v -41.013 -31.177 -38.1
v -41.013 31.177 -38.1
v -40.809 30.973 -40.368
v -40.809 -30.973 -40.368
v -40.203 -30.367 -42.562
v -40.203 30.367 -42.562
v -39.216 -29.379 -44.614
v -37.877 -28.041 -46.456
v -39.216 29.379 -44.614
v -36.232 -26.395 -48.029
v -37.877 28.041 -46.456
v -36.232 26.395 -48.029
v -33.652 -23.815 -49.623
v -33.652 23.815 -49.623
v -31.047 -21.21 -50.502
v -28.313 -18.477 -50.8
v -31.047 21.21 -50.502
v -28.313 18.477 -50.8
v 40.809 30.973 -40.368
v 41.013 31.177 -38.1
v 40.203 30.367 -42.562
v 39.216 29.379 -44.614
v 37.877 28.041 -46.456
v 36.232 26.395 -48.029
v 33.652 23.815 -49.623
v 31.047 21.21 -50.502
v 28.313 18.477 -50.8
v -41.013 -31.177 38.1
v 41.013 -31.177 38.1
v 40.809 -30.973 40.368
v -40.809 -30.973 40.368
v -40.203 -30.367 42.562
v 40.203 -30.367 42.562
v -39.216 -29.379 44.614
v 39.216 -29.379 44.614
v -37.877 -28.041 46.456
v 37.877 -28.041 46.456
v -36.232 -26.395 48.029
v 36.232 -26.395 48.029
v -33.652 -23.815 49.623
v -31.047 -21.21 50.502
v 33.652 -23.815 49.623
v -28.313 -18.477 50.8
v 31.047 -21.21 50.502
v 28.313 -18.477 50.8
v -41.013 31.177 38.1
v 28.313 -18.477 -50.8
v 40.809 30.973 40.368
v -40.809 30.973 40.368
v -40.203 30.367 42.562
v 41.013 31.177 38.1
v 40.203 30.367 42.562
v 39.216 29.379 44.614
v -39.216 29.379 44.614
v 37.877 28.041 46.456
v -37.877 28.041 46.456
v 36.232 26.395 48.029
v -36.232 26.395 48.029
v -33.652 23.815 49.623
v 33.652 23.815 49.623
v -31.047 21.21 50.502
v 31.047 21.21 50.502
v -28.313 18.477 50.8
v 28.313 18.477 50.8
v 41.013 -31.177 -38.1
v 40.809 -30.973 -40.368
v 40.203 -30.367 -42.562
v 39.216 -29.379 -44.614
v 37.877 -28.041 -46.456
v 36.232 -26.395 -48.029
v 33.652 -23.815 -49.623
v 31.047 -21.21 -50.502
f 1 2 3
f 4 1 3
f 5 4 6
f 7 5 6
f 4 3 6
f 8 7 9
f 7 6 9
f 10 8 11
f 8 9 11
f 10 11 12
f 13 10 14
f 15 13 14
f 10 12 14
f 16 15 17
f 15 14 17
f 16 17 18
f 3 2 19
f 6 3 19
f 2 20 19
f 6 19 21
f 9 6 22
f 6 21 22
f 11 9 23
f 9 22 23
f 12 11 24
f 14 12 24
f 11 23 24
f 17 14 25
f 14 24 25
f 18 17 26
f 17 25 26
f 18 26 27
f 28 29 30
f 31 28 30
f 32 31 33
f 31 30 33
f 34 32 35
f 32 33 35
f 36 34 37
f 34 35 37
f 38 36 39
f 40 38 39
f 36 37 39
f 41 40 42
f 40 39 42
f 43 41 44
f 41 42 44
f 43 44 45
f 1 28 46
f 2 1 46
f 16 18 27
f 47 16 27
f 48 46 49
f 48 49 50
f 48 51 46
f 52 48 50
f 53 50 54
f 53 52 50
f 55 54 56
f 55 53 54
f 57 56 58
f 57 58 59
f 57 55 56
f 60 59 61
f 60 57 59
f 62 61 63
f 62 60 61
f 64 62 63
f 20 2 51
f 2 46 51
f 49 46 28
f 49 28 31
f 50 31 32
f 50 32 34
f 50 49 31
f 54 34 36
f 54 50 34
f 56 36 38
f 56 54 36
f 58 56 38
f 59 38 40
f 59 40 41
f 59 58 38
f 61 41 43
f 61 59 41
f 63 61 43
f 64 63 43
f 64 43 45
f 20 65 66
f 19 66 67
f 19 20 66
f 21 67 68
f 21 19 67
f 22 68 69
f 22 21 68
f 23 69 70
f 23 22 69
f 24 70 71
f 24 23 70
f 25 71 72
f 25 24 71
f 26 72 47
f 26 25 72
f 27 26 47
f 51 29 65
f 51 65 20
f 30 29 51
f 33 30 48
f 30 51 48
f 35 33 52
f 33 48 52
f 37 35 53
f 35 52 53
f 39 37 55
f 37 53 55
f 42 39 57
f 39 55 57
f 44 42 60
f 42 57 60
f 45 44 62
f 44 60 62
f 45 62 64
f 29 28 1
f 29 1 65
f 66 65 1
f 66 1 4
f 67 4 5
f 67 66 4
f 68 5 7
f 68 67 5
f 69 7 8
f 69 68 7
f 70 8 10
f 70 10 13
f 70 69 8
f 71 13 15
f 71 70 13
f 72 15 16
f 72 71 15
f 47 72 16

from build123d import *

# Parameters (mm, degrees)
F0_W     = 82.026482
F0_H     = 62.353476
F1_DEPTH = 50.8
F2_R     = 12.7


with BuildPart() as f1:
    # F0 (on Top) → F1 (new body)
    with BuildSketch(Plane.XY):
        Rectangle(F0_W, F0_H)
    extrude(amount=F1_DEPTH)

    # F2
    f2_edges = [f1.edges().sort_by_distance(p)[0] for p in [
        (41.013241, 0, 50.8),
        (0, 31.176738, 50.8),
        (-41.013241, 0, 50.8),
        (0, -31.176738, 50.8),
    ]]
    fillet(f2_edges, radius=F2_R)

    # F3: F1 across plane


with BuildPart() as f1_1:
    add(f1.part)
    add(f1.part.mirror(Plane.XY))


solid = f1_1.part
